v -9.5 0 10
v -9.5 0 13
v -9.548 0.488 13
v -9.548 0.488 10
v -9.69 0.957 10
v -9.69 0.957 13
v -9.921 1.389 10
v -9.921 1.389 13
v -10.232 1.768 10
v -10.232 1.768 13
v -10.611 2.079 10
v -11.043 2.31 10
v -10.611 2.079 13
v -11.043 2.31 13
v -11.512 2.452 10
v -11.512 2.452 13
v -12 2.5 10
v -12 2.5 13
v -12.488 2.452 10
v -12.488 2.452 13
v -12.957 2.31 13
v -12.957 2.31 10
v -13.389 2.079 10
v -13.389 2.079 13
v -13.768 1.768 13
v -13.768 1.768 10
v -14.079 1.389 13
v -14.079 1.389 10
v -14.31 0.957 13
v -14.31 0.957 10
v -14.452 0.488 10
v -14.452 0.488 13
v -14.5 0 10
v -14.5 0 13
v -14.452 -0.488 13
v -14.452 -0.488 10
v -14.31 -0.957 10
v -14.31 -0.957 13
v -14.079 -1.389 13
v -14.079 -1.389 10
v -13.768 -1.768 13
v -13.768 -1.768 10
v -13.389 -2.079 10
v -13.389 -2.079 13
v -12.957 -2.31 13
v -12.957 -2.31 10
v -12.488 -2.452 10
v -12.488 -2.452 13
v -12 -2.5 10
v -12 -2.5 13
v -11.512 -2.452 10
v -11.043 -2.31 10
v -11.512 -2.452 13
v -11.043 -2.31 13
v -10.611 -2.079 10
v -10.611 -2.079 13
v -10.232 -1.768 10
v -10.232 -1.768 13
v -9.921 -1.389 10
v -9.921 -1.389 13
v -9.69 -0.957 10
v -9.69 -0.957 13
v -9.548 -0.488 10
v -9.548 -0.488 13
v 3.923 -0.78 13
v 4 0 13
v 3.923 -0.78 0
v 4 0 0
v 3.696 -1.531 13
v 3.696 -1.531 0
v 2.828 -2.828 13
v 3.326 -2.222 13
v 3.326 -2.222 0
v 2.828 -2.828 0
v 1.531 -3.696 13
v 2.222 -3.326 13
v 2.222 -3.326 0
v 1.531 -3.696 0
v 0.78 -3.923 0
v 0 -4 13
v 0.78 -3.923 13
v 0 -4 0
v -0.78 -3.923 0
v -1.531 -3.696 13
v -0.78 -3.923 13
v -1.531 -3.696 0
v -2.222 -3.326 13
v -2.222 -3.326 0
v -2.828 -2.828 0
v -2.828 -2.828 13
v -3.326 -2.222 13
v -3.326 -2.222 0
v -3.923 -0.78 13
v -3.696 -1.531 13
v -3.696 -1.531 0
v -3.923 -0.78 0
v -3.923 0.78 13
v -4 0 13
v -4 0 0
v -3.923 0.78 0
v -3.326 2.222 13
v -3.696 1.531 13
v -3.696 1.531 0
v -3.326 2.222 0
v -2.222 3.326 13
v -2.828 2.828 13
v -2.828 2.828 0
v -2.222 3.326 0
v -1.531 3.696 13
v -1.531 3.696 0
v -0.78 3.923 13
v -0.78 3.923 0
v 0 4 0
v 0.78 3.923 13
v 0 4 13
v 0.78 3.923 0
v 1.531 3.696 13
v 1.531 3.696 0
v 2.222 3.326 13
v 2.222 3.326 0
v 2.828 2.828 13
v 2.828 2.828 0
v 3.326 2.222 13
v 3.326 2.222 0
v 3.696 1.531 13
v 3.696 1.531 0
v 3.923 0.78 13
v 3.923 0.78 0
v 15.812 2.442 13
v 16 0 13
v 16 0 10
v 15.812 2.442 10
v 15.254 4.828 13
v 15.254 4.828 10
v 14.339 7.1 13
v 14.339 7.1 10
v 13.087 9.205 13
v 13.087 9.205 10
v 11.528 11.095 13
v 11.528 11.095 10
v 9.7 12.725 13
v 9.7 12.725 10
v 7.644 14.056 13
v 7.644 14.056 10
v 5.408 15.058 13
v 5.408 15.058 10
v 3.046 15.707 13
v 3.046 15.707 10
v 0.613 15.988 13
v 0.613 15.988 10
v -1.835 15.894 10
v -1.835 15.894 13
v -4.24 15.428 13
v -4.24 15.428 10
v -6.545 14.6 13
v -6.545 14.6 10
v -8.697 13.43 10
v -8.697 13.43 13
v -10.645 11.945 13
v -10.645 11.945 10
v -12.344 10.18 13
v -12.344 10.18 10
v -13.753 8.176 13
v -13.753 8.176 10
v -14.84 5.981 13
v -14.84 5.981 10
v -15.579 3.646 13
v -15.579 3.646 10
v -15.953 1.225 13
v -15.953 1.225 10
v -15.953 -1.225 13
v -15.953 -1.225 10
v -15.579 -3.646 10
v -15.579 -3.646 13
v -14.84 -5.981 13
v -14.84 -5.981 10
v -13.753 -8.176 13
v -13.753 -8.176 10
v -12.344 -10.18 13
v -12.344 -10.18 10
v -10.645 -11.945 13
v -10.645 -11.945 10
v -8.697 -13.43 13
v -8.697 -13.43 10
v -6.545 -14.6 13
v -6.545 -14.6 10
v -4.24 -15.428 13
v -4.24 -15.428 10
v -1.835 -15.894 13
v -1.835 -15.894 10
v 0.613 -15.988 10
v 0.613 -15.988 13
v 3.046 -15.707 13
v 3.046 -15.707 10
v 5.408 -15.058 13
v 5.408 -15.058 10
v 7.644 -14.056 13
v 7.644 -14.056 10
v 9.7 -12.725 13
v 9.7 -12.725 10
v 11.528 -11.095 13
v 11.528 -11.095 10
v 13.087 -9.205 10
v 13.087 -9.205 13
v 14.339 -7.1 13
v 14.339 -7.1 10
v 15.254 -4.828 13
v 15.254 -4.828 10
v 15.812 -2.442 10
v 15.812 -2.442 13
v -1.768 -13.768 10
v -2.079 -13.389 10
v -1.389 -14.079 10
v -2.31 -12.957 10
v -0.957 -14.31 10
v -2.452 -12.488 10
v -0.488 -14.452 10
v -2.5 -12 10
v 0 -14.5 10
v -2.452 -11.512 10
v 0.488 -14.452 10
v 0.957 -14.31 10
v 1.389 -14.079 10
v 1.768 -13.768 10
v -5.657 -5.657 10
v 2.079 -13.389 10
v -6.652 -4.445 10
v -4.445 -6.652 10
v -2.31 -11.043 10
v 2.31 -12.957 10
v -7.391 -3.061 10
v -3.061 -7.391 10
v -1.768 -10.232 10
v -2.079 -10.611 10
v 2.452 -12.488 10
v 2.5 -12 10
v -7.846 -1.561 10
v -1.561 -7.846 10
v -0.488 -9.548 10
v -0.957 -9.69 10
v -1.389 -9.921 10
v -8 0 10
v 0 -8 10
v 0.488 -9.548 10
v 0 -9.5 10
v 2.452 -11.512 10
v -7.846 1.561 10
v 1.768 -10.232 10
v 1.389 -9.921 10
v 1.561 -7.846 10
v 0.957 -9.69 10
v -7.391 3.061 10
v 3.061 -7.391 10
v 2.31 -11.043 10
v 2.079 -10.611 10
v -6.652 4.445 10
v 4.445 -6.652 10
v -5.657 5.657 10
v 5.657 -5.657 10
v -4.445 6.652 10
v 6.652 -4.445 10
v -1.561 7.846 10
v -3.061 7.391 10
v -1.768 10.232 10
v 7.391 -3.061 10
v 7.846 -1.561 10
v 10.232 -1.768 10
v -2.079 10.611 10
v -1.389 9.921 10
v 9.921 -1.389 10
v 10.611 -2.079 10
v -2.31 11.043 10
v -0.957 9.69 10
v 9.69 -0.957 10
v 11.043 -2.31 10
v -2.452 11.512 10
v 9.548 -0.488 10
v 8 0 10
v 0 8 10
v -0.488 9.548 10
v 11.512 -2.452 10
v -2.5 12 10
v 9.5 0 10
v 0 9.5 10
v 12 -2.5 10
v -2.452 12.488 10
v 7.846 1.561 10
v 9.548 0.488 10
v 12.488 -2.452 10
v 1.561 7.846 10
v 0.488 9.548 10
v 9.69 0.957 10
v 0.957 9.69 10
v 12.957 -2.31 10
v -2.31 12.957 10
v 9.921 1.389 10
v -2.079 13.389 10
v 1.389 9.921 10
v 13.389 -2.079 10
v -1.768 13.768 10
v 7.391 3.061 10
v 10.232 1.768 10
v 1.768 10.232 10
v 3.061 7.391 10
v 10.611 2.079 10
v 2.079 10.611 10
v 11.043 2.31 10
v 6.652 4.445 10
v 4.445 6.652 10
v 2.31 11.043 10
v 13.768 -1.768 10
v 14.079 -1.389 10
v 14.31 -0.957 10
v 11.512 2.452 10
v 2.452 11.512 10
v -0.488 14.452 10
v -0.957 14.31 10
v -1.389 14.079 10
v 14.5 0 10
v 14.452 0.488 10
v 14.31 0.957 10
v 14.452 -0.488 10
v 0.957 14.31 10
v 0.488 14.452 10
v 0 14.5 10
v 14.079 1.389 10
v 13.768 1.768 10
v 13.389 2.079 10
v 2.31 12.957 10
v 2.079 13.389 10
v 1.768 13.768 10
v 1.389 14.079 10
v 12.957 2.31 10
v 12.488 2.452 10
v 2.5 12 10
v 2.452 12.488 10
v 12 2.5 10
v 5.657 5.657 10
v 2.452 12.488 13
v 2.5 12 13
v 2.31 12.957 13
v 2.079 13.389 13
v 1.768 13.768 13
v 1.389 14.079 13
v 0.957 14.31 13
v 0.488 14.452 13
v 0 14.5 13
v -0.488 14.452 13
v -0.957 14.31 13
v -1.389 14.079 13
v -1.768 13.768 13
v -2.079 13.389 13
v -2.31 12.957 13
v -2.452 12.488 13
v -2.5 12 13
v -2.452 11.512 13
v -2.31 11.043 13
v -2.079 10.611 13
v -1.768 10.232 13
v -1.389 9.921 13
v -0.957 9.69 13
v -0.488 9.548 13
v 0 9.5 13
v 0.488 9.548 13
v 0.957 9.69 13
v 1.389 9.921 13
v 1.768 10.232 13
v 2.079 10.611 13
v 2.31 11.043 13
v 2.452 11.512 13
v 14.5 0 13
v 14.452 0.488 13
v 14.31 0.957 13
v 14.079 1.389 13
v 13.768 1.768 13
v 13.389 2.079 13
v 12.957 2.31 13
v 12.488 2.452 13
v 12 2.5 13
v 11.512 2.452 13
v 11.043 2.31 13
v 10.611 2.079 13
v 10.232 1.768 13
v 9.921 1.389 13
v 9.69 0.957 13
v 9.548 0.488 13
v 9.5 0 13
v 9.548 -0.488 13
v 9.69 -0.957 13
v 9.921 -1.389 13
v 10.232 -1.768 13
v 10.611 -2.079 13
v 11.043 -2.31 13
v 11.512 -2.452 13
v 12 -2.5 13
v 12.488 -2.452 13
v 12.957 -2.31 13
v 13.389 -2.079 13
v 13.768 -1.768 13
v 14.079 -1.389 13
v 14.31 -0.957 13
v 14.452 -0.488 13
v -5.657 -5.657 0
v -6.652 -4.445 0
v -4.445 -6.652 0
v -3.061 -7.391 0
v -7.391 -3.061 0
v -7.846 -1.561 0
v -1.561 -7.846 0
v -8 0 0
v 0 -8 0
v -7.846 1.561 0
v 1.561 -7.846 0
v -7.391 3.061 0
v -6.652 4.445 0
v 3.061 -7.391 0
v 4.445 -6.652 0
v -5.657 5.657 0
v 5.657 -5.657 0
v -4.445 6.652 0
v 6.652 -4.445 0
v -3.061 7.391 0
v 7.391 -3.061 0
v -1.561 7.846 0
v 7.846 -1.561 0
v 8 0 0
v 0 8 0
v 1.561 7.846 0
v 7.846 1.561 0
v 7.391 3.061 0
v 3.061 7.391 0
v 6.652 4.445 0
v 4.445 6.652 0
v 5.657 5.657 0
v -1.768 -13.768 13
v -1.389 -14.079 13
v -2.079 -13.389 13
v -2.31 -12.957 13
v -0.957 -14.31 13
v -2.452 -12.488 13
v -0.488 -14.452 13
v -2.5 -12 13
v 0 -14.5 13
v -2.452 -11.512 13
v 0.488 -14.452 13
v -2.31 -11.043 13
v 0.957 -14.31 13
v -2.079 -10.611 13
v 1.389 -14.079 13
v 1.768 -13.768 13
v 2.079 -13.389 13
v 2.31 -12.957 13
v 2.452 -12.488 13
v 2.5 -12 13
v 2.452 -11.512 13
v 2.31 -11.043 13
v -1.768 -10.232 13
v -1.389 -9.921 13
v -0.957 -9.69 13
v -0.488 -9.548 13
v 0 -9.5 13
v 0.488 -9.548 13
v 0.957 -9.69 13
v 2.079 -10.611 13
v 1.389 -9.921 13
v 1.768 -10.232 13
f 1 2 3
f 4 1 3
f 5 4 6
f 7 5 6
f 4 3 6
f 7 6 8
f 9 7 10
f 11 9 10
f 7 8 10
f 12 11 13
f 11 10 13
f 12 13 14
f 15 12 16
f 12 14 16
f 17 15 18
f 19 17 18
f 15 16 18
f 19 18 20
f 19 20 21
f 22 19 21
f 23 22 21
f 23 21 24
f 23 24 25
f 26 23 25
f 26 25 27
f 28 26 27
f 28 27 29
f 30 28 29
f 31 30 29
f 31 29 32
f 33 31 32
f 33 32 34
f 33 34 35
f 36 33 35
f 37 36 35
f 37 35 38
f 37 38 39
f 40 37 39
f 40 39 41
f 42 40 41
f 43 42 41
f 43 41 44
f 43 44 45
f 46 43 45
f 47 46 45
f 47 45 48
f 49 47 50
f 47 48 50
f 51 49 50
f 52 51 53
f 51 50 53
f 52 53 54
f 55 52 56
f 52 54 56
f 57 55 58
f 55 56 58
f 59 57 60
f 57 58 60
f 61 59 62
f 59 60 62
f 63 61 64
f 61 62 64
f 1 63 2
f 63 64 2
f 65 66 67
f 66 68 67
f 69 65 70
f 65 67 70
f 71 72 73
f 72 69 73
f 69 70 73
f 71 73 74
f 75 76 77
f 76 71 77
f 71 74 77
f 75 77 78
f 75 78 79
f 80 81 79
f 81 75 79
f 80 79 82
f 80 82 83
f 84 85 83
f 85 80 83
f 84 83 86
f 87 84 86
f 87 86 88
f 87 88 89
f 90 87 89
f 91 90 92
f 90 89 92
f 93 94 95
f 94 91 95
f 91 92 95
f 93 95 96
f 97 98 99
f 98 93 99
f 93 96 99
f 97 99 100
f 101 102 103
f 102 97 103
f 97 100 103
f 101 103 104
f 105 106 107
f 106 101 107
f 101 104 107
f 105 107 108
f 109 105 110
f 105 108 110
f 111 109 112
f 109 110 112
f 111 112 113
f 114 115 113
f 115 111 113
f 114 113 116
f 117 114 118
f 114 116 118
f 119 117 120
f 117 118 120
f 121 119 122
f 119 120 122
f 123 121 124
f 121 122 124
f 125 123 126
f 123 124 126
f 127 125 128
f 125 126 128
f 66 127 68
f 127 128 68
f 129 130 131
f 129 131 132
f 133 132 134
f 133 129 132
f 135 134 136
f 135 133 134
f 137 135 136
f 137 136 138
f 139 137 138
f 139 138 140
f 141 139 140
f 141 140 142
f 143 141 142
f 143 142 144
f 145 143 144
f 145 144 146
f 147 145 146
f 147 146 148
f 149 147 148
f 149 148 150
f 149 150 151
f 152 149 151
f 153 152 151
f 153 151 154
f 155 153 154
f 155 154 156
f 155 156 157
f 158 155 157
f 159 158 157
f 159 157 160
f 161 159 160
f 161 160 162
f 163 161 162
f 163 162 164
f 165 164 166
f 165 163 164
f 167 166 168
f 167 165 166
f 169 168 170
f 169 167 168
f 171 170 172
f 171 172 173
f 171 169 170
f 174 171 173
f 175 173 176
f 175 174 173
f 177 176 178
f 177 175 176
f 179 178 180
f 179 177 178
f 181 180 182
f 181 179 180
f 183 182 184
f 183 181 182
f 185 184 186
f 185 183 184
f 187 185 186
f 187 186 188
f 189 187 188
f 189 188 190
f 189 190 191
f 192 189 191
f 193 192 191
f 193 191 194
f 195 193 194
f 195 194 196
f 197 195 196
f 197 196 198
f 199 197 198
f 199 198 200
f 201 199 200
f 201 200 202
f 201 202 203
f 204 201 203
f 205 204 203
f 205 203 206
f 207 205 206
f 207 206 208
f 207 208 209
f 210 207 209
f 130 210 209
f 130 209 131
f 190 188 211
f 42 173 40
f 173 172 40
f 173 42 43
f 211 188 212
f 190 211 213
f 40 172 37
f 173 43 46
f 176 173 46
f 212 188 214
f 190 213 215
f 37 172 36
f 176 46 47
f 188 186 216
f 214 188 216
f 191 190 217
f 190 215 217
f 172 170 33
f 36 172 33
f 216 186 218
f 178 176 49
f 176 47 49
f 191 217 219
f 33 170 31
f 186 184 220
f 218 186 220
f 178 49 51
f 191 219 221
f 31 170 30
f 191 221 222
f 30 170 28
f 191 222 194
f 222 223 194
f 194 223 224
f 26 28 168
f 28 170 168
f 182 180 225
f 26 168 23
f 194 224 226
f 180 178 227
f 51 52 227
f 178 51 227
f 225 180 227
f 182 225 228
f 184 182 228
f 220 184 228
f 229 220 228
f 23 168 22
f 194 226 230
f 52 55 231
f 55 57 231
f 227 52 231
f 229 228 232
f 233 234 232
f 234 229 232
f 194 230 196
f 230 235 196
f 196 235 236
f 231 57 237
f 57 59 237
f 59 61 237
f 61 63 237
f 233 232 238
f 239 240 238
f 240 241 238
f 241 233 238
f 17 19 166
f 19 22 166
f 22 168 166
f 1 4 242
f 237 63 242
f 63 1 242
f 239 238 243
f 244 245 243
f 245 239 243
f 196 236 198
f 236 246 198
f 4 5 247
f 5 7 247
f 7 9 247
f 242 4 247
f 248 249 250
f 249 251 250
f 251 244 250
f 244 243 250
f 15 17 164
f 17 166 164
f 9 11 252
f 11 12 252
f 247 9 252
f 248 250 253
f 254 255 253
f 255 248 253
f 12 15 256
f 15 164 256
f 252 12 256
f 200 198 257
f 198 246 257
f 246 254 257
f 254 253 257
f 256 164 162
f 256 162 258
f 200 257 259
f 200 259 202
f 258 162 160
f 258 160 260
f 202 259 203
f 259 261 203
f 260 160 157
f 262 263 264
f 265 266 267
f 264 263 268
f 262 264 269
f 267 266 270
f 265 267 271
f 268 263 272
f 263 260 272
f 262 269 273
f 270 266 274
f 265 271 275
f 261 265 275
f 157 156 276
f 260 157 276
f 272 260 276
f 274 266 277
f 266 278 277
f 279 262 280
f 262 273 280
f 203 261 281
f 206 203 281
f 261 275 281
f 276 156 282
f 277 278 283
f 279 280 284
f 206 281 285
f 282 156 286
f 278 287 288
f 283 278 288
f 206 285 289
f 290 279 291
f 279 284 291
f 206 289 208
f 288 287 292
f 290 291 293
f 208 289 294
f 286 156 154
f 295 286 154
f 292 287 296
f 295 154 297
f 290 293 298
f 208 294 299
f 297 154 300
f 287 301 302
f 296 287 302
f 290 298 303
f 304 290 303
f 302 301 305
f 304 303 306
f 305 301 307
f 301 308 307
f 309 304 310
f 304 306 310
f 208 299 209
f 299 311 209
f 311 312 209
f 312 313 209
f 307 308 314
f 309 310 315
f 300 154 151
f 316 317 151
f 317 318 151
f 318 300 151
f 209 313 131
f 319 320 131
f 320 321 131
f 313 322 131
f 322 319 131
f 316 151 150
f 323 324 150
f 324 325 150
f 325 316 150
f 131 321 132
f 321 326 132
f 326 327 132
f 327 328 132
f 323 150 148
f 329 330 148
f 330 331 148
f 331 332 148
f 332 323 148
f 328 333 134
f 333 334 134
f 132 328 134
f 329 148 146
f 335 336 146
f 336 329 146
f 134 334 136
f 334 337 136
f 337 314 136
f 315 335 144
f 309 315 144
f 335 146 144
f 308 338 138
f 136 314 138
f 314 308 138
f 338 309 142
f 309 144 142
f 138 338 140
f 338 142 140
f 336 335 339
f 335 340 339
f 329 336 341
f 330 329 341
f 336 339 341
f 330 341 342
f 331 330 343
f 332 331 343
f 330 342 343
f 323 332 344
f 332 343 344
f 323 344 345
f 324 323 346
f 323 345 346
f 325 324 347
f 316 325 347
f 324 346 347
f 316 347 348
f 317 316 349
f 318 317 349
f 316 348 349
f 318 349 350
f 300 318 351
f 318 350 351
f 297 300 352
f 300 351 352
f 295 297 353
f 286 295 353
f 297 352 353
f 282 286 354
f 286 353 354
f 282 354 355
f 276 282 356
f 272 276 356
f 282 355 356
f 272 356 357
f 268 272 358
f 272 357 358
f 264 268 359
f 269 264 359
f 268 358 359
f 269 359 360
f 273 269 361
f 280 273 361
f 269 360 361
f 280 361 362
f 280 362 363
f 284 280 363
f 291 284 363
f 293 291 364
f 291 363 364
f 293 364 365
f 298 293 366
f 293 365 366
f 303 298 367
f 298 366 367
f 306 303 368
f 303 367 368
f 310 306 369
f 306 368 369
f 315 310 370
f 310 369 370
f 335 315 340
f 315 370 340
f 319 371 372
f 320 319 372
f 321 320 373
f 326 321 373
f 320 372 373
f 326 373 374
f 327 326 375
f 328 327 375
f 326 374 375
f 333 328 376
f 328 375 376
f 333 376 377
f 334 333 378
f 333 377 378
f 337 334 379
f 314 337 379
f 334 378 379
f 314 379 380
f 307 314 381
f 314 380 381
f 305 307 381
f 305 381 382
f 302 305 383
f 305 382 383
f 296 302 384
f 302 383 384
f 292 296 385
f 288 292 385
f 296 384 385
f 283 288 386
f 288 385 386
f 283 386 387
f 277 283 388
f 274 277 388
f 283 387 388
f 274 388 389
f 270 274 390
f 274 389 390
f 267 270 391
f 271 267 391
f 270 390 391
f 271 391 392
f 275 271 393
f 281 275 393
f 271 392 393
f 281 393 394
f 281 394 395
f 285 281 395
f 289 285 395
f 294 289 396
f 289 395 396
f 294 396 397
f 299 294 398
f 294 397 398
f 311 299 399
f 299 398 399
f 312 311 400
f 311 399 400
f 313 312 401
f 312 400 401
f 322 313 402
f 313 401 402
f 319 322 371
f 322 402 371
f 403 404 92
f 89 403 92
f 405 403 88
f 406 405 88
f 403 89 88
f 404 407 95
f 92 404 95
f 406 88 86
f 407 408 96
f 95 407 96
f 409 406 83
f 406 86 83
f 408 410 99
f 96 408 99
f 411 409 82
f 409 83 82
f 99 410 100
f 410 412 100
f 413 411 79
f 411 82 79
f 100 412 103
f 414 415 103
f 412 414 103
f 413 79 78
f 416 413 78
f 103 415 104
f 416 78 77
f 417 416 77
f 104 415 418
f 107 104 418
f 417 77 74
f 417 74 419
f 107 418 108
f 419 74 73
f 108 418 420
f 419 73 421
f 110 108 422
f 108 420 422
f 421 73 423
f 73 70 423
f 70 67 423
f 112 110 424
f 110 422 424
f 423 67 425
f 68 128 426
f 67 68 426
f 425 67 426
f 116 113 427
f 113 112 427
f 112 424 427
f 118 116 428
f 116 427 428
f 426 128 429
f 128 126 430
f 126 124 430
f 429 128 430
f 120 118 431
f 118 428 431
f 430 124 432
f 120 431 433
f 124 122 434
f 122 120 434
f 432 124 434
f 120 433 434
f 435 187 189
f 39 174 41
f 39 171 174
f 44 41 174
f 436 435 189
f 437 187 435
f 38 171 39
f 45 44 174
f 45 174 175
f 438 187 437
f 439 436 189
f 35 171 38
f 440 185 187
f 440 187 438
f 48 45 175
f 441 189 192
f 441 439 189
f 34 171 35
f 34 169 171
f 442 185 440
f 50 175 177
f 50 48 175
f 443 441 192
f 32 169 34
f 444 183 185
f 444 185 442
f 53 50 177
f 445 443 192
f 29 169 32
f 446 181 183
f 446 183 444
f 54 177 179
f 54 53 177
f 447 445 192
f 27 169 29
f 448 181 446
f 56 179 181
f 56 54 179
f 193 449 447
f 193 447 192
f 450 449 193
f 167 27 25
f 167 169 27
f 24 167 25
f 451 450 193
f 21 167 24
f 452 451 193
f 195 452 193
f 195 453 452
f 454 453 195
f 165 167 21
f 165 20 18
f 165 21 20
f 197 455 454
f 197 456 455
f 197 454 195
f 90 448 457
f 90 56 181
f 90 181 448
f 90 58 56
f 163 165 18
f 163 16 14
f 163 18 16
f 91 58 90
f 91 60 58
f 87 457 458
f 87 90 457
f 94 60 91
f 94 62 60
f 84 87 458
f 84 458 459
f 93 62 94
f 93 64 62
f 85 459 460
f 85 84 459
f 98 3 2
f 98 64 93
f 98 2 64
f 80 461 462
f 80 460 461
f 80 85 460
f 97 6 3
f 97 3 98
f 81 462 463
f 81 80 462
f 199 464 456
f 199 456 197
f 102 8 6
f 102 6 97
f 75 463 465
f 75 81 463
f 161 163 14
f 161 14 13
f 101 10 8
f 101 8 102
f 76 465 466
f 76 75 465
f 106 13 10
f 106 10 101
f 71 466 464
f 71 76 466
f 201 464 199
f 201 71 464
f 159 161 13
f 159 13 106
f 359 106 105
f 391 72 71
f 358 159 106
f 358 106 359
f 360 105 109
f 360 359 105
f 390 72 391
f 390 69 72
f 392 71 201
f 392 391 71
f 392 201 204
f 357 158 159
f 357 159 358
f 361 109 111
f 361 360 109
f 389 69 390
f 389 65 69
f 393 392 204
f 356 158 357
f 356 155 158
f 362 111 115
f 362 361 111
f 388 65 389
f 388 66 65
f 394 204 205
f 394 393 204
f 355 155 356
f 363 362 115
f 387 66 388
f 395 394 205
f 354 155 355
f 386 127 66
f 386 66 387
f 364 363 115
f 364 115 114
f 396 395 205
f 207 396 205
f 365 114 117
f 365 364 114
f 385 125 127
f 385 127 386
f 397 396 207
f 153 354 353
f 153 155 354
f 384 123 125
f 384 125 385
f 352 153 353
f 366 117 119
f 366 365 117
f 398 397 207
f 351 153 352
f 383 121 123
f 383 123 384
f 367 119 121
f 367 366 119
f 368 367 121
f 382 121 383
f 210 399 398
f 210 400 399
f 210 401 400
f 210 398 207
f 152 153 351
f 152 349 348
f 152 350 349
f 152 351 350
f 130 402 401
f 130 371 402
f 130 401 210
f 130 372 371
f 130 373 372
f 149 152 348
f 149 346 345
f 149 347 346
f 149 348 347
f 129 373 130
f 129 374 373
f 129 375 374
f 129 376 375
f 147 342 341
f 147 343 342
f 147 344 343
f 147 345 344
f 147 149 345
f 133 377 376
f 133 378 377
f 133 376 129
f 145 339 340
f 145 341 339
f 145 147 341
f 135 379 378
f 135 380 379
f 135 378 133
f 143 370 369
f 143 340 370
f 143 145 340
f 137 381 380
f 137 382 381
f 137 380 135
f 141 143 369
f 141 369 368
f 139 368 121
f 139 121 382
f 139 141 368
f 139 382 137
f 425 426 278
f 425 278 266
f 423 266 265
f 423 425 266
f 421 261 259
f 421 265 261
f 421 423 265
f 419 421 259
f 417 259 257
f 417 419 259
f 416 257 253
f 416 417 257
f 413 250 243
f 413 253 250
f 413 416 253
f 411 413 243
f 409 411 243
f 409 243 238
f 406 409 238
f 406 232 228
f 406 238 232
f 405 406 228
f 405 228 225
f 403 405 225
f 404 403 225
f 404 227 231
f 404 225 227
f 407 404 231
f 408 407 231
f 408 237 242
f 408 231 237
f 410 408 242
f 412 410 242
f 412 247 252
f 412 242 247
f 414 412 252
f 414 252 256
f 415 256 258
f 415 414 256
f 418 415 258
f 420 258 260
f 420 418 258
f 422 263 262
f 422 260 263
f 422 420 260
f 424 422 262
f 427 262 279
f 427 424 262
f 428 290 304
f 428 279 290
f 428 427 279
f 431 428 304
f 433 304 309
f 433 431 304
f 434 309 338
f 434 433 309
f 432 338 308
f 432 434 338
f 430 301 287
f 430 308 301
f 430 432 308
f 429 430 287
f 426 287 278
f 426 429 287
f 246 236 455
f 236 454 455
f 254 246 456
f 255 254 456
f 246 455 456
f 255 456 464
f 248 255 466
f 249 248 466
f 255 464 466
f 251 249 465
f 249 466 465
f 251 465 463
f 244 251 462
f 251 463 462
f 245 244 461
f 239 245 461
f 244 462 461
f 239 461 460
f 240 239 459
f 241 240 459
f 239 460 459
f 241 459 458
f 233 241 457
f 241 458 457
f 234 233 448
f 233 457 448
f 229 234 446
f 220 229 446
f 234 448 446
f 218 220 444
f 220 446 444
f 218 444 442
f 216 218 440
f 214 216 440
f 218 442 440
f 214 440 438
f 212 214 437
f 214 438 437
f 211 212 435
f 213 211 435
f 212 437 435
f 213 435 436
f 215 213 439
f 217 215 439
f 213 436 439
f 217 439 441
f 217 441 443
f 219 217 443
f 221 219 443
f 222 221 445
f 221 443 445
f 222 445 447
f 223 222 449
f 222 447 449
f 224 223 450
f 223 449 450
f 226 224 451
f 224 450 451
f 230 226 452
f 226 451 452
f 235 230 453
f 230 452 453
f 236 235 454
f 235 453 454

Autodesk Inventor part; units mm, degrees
ref_plane "YZ Plane" through (0, 0, 0) normal (1, 0, 0) x (0, 1, 0)
ref_plane "XZ Plane" through (0, 0, 0) normal (0, 1, 0) x (-1, 0, 0)
ref_plane "XY Plane" through (0, 0, 0) normal (0, 0, 1) x (1, 0, 0)
sketch "Sketch1" plane through (0, 0, 0) normal (0, 0, 1) x (1, 0, 0)
  circle A0 centre (0, 0) radius 4
  circle A1 centre (0, 0) radius 8
  dimension "d0" = 8
  dimension "d1" = 16
extrude "Extrusion1" add sketch "Sketch1" along normal blind 13
sketch "Sketch2" plane through (0, 0, 13) normal (0, 0, 1) x (1, 0, 0)
  circle A0 centre (0, 0) radius 16
  circle A1 centre (0, 0) radius 8 projected
  dimension "d4" = 32
extrude "Extrusion2" add sketch "Sketch2" against normal blind 3
sketch "Sketch3" plane through (0, 0, 13) normal (0, 0, 1) x (1, 0, 0)
  circle A0 centre (12, 0) radius 2.5
  circle A1 centre (0, 12) radius 2.5
  circle A2 centre (-12, 0) radius 2.5
  circle A3 centre (0, -12) radius 2.5
  point P0 (0, 0)
  dimension "d7" = 5
  dimension "d8" = 12
  dimension "d11" = 360
extrude "Extrusion3" cut sketch "Sketch3" against normal through all
properties part number "8mm Mounting Hub" material "Steel, Mild"
